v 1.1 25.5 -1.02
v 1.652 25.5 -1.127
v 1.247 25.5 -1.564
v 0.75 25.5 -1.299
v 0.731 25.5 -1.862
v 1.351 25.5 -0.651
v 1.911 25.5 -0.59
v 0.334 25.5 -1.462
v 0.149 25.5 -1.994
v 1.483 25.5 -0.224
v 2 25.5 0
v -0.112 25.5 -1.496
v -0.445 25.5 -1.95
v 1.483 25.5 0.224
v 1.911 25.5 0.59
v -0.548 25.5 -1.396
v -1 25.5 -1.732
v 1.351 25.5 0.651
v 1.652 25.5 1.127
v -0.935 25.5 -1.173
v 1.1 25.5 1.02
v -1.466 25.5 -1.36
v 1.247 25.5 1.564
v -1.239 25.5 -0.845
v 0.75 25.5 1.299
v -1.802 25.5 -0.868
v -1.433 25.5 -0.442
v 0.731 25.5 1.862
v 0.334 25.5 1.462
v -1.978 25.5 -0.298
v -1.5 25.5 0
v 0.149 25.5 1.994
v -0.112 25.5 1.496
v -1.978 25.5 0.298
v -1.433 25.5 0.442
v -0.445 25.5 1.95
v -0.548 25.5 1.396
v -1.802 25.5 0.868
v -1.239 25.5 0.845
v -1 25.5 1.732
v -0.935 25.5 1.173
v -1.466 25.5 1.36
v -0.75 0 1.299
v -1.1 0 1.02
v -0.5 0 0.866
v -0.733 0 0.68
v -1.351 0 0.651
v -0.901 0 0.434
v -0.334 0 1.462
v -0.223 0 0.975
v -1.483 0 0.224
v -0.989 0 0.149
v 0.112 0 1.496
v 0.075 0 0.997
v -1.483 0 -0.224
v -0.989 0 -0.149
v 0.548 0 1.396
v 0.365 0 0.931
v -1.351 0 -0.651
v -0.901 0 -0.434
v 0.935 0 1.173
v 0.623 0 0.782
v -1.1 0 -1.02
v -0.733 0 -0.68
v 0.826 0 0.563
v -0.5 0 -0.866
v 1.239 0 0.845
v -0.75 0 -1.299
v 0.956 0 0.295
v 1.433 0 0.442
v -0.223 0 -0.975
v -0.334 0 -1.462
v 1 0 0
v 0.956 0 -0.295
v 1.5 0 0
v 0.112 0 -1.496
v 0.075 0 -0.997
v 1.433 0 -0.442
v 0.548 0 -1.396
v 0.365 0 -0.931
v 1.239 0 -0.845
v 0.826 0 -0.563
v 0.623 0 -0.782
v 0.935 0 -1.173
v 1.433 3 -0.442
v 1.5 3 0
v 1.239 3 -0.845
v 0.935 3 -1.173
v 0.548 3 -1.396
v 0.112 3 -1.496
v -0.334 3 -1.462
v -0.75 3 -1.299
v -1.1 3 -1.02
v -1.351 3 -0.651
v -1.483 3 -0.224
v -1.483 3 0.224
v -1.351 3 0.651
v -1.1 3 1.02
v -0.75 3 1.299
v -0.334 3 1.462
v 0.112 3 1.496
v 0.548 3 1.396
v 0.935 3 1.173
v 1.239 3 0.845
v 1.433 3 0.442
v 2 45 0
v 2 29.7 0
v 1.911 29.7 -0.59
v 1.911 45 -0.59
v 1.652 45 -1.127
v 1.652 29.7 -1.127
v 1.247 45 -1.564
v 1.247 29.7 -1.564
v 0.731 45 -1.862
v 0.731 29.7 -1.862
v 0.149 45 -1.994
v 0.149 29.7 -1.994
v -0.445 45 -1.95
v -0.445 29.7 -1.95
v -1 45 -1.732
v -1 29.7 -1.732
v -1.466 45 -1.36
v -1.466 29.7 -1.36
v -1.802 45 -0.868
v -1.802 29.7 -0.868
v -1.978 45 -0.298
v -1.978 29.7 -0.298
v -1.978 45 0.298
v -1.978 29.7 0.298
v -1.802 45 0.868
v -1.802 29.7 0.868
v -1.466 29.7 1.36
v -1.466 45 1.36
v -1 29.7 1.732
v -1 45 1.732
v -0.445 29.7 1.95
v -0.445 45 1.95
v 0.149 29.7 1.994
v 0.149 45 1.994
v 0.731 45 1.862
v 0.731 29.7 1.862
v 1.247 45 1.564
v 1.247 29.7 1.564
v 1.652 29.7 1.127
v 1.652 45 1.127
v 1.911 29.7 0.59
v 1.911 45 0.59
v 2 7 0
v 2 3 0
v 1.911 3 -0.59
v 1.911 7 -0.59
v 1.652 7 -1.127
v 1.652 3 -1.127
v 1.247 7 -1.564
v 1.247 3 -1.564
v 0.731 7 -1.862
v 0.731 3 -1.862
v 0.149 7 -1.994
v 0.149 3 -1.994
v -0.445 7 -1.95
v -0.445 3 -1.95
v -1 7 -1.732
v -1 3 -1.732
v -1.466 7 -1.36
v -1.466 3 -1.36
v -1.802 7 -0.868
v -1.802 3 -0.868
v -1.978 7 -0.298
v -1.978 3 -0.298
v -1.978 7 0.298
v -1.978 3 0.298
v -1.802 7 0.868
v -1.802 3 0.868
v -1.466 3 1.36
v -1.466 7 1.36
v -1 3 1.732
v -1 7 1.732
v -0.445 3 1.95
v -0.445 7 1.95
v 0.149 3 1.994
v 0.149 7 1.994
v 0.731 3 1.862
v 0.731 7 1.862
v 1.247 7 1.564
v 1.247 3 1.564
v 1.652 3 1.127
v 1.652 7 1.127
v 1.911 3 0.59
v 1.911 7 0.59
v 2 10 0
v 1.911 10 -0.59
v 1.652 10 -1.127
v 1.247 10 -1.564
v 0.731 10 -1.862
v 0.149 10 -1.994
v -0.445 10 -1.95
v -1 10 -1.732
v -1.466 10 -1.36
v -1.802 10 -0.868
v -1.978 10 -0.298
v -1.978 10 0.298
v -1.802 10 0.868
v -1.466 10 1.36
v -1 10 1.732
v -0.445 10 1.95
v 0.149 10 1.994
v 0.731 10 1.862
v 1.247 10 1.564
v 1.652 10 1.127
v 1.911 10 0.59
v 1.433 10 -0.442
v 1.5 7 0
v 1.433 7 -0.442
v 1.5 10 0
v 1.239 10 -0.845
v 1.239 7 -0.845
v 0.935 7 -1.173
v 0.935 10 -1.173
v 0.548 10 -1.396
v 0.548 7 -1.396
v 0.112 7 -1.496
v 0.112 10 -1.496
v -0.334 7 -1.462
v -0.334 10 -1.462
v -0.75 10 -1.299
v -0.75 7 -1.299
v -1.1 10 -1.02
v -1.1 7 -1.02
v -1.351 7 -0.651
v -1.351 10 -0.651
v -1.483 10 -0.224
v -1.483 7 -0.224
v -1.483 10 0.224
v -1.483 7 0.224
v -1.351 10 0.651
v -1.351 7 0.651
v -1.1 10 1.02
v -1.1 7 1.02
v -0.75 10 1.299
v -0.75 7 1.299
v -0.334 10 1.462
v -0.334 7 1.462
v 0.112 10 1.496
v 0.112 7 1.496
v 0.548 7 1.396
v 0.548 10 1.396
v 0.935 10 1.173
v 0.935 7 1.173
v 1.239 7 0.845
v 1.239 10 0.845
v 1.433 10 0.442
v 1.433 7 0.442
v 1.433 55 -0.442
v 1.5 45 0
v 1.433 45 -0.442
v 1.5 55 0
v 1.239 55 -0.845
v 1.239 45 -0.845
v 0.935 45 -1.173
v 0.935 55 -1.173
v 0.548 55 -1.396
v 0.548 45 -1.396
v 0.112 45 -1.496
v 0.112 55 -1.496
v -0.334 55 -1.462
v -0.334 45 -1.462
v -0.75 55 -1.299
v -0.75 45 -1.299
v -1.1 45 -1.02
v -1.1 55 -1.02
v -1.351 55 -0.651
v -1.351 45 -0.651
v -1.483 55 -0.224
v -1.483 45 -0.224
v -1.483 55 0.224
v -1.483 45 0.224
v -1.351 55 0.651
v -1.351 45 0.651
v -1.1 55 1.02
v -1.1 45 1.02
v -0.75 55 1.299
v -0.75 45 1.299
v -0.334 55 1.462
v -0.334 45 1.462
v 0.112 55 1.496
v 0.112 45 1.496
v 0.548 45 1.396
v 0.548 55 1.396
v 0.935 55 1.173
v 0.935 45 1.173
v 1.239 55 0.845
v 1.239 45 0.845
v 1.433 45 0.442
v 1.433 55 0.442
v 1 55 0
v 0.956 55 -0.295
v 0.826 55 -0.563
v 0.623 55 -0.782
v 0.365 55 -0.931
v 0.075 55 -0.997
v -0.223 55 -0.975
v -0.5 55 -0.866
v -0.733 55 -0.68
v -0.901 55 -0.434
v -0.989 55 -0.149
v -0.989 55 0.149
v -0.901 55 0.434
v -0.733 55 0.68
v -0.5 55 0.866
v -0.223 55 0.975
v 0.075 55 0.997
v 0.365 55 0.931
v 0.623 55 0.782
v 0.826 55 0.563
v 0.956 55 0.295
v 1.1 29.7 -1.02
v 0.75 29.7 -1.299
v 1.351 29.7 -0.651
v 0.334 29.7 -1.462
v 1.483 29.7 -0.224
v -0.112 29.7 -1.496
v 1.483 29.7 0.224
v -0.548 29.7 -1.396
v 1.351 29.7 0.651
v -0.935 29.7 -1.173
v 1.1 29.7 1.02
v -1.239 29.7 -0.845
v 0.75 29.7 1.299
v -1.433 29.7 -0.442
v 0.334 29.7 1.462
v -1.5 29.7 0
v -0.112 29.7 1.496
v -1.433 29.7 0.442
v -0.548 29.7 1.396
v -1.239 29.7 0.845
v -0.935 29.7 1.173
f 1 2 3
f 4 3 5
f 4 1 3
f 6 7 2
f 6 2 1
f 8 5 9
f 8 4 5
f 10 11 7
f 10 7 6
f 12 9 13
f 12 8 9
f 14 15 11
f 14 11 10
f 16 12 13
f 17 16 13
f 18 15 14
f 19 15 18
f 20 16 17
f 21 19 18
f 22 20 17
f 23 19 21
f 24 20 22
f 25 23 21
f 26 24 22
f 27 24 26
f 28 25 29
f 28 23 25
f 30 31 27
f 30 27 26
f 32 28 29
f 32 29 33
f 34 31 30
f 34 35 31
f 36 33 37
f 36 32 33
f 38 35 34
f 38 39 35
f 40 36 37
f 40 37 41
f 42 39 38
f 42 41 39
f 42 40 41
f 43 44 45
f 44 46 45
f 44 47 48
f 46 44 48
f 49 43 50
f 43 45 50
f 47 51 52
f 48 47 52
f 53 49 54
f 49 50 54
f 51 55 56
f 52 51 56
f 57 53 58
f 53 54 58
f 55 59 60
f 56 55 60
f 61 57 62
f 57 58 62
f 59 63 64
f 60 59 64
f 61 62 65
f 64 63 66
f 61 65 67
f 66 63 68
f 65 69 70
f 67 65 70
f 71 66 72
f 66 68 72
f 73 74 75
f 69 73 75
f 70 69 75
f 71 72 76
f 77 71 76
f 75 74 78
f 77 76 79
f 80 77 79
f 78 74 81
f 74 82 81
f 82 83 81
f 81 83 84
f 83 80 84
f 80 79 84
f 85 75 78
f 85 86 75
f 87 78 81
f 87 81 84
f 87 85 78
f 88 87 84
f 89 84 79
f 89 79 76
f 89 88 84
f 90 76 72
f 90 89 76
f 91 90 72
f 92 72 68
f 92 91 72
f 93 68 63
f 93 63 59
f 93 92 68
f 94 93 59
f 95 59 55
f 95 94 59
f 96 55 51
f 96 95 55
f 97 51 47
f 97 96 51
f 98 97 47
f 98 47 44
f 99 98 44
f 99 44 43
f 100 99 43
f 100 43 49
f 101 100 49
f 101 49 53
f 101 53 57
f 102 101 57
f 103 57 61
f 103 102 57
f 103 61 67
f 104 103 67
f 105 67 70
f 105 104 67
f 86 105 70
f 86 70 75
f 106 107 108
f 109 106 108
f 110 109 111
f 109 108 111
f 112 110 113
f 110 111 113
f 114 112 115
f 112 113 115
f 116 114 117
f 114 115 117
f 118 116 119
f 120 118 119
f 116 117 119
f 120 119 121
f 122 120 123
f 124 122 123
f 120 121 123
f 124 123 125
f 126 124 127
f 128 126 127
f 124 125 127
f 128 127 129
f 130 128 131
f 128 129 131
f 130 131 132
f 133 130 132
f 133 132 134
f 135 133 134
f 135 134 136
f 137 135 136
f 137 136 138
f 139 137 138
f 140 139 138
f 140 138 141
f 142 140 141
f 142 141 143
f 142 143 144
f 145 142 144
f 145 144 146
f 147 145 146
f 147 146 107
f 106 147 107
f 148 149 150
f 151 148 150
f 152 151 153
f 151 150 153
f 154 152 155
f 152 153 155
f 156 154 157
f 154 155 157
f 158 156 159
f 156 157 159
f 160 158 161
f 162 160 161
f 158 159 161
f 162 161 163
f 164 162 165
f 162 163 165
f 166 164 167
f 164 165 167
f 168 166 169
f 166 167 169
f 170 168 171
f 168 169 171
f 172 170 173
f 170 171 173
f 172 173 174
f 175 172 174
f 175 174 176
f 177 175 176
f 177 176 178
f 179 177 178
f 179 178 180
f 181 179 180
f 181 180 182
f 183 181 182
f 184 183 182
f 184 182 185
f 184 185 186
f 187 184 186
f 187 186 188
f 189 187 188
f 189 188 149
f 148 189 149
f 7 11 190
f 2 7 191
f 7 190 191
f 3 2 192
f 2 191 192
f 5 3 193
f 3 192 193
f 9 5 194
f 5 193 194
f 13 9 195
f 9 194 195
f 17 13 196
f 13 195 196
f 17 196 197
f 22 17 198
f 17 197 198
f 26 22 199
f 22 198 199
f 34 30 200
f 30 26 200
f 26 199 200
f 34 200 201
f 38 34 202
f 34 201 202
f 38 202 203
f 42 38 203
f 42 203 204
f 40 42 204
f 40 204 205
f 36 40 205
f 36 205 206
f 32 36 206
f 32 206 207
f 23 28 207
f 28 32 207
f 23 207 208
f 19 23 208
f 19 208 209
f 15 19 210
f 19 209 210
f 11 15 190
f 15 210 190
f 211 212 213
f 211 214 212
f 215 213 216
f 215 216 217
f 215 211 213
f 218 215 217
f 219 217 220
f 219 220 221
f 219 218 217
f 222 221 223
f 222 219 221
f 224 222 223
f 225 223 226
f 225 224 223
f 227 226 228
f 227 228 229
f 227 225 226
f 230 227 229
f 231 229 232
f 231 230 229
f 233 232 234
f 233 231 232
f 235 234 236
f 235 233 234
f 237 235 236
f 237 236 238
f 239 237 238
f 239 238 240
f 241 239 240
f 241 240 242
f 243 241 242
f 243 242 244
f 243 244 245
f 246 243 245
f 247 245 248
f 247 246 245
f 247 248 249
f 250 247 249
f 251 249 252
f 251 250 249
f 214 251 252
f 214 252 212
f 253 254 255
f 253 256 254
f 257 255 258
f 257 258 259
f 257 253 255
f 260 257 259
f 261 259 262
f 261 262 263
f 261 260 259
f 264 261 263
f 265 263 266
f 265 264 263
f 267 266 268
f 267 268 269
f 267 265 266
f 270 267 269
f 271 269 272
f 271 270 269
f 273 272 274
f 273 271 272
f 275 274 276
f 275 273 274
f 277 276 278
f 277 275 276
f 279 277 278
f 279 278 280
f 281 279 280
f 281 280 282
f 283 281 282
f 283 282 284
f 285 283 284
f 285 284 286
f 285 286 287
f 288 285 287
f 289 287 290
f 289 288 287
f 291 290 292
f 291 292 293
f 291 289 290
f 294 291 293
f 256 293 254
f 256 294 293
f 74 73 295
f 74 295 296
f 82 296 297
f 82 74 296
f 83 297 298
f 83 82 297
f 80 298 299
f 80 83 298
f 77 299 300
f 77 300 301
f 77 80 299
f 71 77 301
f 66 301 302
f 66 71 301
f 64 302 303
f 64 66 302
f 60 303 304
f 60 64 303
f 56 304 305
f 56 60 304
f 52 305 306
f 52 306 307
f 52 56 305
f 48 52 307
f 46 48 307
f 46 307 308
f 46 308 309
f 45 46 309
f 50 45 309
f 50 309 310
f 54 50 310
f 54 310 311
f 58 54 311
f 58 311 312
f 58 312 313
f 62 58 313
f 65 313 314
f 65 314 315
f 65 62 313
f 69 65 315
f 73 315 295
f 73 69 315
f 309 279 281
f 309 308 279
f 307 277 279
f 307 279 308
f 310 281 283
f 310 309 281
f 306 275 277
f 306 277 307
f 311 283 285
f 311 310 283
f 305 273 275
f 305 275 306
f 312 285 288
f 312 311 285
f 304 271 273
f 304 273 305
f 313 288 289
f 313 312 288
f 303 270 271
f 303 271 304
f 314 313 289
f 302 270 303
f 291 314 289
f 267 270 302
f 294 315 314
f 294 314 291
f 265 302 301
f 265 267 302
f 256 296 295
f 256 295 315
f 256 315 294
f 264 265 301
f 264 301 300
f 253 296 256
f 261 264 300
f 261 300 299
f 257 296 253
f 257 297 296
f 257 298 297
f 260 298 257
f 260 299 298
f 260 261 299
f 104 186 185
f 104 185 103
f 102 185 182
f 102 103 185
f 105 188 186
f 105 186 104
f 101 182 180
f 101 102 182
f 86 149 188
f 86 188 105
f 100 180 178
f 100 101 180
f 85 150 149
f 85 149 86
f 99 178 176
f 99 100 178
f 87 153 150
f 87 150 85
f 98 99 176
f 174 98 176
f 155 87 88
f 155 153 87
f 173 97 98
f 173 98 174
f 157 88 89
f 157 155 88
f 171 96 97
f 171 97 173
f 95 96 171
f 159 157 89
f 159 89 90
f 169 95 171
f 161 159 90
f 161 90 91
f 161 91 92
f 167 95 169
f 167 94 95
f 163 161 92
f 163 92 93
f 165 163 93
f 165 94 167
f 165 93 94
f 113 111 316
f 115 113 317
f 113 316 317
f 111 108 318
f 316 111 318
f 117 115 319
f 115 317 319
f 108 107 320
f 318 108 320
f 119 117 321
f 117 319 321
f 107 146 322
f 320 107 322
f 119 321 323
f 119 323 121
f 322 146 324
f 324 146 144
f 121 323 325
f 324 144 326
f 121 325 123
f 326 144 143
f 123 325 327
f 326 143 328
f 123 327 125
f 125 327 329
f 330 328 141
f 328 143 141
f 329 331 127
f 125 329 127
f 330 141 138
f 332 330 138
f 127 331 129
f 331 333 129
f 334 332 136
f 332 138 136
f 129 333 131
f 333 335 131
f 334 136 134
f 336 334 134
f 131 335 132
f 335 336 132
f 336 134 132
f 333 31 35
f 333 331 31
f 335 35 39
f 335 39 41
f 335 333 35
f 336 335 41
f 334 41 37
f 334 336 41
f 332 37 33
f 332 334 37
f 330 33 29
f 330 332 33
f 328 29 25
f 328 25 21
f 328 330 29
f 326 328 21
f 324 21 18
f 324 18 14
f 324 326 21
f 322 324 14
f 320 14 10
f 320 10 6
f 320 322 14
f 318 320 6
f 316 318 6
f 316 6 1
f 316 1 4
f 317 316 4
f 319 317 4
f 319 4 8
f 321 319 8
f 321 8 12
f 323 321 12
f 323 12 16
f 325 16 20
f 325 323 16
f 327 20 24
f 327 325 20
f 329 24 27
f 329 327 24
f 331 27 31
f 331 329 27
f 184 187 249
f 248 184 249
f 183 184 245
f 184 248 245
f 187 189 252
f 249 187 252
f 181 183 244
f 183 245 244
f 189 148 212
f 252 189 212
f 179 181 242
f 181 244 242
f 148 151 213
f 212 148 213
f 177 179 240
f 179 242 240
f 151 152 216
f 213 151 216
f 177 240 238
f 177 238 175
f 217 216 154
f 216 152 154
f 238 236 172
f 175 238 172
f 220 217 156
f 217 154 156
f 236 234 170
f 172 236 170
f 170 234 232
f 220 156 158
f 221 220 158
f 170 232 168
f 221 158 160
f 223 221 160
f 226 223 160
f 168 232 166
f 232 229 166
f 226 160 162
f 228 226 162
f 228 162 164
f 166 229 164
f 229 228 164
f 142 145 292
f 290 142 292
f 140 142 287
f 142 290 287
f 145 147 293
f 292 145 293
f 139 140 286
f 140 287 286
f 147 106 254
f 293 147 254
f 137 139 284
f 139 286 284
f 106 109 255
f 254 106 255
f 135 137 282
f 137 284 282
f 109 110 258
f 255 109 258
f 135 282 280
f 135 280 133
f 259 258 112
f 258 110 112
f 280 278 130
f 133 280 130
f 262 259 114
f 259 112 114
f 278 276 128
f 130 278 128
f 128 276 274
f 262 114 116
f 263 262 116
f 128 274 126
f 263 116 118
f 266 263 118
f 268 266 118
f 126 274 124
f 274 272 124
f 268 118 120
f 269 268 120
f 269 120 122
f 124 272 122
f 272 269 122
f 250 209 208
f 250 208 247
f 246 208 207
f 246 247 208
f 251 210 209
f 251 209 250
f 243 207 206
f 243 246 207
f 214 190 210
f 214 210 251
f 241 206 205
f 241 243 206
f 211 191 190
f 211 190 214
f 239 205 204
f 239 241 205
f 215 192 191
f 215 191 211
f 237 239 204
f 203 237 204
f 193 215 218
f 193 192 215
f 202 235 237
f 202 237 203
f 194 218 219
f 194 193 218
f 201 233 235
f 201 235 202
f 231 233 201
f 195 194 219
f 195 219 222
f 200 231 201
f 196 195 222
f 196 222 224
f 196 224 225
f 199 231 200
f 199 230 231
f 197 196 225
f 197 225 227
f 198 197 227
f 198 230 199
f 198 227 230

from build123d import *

# Parameters (mm, degrees)
SKETCH_1_R      = 2
SKETCH_1_R_2    = 1
EXTRUDE_1_DEPTH = 55
SKETCH_2_W      = 0.5
SKETCH_2_H      = 3
SKETCH_2_H_2    = 10
SKETCH_4_W      = 0.5
SKETCH_4_H      = 4.2


with BuildPart() as part:
    # Эскиз1 → Бобышка-Вытянуть1 (new body)
    with BuildSketch(Plane(origin=(0, 0, 0), x_dir=(1, 0, 0), z_dir=(0, 1, 0))):
        Circle(SKETCH_1_R)
        Circle(SKETCH_1_R_2, mode=Mode.SUBTRACT)
    extrude(amount=EXTRUDE_1_DEPTH)

    # Эскиз2 → Вырез-Повернуть1 (revolve, cut)
    with BuildSketch(Plane.XY):
        with Locations((1.75, 1.5)):
            Rectangle(SKETCH_2_W, SKETCH_2_H)
        with Locations((1.75, 8.5)):
            Rectangle(SKETCH_2_W, SKETCH_2_H)
        with Locations((1.75, 50)):
            Rectangle(SKETCH_2_W, SKETCH_2_H_2)
    revolve(axis=Axis((0, 0, 0), (0, 1, 0)), mode=Mode.SUBTRACT)

    # Эскиз4 → Вырез-Повернуть2 (revolve, cut)
    with BuildSketch(Plane.XY):
        with Locations((-1.75, 27.6)):
            Rectangle(SKETCH_4_W, SKETCH_4_H)
    revolve(axis=Axis((0, 0, 0), (0, 1, 0)), mode=Mode.SUBTRACT)


solid = part.part
